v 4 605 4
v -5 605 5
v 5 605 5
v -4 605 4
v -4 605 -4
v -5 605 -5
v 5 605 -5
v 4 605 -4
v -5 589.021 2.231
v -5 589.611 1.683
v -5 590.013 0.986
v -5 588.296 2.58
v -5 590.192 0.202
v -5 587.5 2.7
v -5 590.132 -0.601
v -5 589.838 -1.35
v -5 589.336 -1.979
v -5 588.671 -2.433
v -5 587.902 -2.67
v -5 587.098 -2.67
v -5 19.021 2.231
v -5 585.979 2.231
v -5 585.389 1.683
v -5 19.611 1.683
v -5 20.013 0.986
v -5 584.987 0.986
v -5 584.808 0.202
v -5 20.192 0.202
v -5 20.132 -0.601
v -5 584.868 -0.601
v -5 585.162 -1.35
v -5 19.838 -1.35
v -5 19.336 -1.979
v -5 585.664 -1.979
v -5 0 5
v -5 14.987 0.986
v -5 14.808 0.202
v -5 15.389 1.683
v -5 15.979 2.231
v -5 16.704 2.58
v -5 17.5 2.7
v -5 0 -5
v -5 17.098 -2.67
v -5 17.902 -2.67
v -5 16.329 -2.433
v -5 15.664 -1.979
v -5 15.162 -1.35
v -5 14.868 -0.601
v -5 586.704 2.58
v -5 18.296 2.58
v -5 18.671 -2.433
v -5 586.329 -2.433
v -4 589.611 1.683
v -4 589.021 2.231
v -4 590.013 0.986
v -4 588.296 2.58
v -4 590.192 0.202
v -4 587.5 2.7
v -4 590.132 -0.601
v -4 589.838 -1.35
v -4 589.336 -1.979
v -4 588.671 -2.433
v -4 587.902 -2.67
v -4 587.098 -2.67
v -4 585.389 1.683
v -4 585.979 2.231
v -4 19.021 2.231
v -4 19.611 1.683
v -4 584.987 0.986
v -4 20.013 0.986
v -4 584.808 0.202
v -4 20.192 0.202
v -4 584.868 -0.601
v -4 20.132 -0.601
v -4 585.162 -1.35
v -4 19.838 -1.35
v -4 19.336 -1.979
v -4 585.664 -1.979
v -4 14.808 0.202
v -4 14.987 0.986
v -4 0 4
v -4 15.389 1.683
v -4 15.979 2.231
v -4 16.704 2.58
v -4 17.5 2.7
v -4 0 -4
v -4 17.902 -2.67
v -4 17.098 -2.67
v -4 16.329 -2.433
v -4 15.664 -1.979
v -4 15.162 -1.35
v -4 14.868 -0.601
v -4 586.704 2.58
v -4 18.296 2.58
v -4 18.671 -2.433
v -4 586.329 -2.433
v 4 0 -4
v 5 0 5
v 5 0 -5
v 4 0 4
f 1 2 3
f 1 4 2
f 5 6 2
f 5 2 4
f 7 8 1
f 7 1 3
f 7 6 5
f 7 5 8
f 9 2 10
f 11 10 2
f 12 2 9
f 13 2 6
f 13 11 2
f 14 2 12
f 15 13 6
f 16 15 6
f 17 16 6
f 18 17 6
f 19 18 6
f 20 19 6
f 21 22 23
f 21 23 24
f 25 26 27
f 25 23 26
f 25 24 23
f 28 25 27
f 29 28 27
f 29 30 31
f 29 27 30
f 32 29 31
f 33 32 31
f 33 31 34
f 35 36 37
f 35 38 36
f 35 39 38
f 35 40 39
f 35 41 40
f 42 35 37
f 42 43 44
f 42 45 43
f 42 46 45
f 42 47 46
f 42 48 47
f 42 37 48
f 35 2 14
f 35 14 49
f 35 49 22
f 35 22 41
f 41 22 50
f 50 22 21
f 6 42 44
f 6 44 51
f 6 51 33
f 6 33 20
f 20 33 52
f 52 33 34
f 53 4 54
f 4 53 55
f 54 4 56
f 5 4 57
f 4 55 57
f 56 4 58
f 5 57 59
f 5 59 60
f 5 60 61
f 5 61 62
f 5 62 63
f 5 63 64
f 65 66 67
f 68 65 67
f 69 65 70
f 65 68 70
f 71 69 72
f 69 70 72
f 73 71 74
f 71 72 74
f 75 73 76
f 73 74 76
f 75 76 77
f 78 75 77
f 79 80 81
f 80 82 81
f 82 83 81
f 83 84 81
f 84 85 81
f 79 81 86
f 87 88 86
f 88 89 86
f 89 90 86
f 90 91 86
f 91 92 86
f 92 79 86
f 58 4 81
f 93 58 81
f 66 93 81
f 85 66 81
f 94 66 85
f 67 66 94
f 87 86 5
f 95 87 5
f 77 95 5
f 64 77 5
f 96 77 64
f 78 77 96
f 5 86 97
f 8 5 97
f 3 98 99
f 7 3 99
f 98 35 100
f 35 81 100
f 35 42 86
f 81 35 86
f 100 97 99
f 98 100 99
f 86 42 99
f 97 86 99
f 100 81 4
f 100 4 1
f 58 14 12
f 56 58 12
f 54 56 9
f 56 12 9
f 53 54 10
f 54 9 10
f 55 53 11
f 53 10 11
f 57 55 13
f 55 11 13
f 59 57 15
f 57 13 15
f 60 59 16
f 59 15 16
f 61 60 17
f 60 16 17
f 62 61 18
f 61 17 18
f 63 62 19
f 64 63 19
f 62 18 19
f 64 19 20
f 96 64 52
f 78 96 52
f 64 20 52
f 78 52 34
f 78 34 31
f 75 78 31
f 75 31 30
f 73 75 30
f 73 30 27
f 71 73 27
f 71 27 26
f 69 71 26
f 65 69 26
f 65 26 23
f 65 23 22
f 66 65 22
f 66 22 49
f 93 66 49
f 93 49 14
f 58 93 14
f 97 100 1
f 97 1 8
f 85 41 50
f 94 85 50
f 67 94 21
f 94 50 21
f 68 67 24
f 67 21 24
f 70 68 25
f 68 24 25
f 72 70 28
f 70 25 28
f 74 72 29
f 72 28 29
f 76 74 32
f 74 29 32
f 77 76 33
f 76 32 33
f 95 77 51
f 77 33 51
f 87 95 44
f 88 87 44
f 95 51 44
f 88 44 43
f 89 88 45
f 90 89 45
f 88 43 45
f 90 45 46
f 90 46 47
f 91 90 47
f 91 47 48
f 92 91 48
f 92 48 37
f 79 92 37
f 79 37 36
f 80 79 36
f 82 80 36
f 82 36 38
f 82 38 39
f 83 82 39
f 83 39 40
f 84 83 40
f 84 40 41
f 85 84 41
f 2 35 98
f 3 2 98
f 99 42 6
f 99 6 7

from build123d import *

# Parameters (mm, degrees)
SKETCH_1_W          = 10
SKETCH_1_H          = 10
SKETCH_1_W_2        = 8
SKETCH_1_H_2        = 8
EXTRUDE_1_DEPTH     = 605
CUT_EXTRUDE_1_REACH = 607.103
SKETCH_2_R          = 2.7


with BuildPart() as part:
    # Эскиз1 → Бобышка-Вытянуть1 (new body)
    with BuildSketch(Plane(origin=(0, 0, 0), x_dir=(1, 0, 0), z_dir=(0, 1, 0))):
        Rectangle(SKETCH_1_W, SKETCH_1_H)
        Rectangle(SKETCH_1_W_2, SKETCH_1_H_2, mode=Mode.SUBTRACT)
    extrude(amount=EXTRUDE_1_DEPTH)

    # Эскиз2 → Вырез-Вытянуть1 (cut, up to next)
    with BuildSketch(Plane.ZY.offset(5), mode=Mode.PRIVATE) as cut_extrude_1_sk1:
        with Locations((0, 17.5)):
            Circle(SKETCH_2_R)
    cut_extrude_1_tool1 = extrude(cut_extrude_1_sk1.sketch, amount=-CUT_EXTRUDE_1_REACH, mode=Mode.PRIVATE) & part.part
    # Эскиз2 → Вырез-Вытянуть1 (cut, up to next)
    with BuildSketch(Plane.ZY.offset(5), mode=Mode.PRIVATE) as cut_extrude_1_sk2:
        with Locations((0, 587.5)):
            Circle(SKETCH_2_R)
    cut_extrude_1_tool2 = extrude(cut_extrude_1_sk2.sketch, amount=-CUT_EXTRUDE_1_REACH, mode=Mode.PRIVATE) & part.part
    add(cut_extrude_1_tool1.solids().sort_by_distance((-5, 17.5, 0))[0], mode=Mode.SUBTRACT)
    add(cut_extrude_1_tool2.solids().sort_by_distance((-5, 587.5, 0))[0], mode=Mode.SUBTRACT)


solid = part.part
